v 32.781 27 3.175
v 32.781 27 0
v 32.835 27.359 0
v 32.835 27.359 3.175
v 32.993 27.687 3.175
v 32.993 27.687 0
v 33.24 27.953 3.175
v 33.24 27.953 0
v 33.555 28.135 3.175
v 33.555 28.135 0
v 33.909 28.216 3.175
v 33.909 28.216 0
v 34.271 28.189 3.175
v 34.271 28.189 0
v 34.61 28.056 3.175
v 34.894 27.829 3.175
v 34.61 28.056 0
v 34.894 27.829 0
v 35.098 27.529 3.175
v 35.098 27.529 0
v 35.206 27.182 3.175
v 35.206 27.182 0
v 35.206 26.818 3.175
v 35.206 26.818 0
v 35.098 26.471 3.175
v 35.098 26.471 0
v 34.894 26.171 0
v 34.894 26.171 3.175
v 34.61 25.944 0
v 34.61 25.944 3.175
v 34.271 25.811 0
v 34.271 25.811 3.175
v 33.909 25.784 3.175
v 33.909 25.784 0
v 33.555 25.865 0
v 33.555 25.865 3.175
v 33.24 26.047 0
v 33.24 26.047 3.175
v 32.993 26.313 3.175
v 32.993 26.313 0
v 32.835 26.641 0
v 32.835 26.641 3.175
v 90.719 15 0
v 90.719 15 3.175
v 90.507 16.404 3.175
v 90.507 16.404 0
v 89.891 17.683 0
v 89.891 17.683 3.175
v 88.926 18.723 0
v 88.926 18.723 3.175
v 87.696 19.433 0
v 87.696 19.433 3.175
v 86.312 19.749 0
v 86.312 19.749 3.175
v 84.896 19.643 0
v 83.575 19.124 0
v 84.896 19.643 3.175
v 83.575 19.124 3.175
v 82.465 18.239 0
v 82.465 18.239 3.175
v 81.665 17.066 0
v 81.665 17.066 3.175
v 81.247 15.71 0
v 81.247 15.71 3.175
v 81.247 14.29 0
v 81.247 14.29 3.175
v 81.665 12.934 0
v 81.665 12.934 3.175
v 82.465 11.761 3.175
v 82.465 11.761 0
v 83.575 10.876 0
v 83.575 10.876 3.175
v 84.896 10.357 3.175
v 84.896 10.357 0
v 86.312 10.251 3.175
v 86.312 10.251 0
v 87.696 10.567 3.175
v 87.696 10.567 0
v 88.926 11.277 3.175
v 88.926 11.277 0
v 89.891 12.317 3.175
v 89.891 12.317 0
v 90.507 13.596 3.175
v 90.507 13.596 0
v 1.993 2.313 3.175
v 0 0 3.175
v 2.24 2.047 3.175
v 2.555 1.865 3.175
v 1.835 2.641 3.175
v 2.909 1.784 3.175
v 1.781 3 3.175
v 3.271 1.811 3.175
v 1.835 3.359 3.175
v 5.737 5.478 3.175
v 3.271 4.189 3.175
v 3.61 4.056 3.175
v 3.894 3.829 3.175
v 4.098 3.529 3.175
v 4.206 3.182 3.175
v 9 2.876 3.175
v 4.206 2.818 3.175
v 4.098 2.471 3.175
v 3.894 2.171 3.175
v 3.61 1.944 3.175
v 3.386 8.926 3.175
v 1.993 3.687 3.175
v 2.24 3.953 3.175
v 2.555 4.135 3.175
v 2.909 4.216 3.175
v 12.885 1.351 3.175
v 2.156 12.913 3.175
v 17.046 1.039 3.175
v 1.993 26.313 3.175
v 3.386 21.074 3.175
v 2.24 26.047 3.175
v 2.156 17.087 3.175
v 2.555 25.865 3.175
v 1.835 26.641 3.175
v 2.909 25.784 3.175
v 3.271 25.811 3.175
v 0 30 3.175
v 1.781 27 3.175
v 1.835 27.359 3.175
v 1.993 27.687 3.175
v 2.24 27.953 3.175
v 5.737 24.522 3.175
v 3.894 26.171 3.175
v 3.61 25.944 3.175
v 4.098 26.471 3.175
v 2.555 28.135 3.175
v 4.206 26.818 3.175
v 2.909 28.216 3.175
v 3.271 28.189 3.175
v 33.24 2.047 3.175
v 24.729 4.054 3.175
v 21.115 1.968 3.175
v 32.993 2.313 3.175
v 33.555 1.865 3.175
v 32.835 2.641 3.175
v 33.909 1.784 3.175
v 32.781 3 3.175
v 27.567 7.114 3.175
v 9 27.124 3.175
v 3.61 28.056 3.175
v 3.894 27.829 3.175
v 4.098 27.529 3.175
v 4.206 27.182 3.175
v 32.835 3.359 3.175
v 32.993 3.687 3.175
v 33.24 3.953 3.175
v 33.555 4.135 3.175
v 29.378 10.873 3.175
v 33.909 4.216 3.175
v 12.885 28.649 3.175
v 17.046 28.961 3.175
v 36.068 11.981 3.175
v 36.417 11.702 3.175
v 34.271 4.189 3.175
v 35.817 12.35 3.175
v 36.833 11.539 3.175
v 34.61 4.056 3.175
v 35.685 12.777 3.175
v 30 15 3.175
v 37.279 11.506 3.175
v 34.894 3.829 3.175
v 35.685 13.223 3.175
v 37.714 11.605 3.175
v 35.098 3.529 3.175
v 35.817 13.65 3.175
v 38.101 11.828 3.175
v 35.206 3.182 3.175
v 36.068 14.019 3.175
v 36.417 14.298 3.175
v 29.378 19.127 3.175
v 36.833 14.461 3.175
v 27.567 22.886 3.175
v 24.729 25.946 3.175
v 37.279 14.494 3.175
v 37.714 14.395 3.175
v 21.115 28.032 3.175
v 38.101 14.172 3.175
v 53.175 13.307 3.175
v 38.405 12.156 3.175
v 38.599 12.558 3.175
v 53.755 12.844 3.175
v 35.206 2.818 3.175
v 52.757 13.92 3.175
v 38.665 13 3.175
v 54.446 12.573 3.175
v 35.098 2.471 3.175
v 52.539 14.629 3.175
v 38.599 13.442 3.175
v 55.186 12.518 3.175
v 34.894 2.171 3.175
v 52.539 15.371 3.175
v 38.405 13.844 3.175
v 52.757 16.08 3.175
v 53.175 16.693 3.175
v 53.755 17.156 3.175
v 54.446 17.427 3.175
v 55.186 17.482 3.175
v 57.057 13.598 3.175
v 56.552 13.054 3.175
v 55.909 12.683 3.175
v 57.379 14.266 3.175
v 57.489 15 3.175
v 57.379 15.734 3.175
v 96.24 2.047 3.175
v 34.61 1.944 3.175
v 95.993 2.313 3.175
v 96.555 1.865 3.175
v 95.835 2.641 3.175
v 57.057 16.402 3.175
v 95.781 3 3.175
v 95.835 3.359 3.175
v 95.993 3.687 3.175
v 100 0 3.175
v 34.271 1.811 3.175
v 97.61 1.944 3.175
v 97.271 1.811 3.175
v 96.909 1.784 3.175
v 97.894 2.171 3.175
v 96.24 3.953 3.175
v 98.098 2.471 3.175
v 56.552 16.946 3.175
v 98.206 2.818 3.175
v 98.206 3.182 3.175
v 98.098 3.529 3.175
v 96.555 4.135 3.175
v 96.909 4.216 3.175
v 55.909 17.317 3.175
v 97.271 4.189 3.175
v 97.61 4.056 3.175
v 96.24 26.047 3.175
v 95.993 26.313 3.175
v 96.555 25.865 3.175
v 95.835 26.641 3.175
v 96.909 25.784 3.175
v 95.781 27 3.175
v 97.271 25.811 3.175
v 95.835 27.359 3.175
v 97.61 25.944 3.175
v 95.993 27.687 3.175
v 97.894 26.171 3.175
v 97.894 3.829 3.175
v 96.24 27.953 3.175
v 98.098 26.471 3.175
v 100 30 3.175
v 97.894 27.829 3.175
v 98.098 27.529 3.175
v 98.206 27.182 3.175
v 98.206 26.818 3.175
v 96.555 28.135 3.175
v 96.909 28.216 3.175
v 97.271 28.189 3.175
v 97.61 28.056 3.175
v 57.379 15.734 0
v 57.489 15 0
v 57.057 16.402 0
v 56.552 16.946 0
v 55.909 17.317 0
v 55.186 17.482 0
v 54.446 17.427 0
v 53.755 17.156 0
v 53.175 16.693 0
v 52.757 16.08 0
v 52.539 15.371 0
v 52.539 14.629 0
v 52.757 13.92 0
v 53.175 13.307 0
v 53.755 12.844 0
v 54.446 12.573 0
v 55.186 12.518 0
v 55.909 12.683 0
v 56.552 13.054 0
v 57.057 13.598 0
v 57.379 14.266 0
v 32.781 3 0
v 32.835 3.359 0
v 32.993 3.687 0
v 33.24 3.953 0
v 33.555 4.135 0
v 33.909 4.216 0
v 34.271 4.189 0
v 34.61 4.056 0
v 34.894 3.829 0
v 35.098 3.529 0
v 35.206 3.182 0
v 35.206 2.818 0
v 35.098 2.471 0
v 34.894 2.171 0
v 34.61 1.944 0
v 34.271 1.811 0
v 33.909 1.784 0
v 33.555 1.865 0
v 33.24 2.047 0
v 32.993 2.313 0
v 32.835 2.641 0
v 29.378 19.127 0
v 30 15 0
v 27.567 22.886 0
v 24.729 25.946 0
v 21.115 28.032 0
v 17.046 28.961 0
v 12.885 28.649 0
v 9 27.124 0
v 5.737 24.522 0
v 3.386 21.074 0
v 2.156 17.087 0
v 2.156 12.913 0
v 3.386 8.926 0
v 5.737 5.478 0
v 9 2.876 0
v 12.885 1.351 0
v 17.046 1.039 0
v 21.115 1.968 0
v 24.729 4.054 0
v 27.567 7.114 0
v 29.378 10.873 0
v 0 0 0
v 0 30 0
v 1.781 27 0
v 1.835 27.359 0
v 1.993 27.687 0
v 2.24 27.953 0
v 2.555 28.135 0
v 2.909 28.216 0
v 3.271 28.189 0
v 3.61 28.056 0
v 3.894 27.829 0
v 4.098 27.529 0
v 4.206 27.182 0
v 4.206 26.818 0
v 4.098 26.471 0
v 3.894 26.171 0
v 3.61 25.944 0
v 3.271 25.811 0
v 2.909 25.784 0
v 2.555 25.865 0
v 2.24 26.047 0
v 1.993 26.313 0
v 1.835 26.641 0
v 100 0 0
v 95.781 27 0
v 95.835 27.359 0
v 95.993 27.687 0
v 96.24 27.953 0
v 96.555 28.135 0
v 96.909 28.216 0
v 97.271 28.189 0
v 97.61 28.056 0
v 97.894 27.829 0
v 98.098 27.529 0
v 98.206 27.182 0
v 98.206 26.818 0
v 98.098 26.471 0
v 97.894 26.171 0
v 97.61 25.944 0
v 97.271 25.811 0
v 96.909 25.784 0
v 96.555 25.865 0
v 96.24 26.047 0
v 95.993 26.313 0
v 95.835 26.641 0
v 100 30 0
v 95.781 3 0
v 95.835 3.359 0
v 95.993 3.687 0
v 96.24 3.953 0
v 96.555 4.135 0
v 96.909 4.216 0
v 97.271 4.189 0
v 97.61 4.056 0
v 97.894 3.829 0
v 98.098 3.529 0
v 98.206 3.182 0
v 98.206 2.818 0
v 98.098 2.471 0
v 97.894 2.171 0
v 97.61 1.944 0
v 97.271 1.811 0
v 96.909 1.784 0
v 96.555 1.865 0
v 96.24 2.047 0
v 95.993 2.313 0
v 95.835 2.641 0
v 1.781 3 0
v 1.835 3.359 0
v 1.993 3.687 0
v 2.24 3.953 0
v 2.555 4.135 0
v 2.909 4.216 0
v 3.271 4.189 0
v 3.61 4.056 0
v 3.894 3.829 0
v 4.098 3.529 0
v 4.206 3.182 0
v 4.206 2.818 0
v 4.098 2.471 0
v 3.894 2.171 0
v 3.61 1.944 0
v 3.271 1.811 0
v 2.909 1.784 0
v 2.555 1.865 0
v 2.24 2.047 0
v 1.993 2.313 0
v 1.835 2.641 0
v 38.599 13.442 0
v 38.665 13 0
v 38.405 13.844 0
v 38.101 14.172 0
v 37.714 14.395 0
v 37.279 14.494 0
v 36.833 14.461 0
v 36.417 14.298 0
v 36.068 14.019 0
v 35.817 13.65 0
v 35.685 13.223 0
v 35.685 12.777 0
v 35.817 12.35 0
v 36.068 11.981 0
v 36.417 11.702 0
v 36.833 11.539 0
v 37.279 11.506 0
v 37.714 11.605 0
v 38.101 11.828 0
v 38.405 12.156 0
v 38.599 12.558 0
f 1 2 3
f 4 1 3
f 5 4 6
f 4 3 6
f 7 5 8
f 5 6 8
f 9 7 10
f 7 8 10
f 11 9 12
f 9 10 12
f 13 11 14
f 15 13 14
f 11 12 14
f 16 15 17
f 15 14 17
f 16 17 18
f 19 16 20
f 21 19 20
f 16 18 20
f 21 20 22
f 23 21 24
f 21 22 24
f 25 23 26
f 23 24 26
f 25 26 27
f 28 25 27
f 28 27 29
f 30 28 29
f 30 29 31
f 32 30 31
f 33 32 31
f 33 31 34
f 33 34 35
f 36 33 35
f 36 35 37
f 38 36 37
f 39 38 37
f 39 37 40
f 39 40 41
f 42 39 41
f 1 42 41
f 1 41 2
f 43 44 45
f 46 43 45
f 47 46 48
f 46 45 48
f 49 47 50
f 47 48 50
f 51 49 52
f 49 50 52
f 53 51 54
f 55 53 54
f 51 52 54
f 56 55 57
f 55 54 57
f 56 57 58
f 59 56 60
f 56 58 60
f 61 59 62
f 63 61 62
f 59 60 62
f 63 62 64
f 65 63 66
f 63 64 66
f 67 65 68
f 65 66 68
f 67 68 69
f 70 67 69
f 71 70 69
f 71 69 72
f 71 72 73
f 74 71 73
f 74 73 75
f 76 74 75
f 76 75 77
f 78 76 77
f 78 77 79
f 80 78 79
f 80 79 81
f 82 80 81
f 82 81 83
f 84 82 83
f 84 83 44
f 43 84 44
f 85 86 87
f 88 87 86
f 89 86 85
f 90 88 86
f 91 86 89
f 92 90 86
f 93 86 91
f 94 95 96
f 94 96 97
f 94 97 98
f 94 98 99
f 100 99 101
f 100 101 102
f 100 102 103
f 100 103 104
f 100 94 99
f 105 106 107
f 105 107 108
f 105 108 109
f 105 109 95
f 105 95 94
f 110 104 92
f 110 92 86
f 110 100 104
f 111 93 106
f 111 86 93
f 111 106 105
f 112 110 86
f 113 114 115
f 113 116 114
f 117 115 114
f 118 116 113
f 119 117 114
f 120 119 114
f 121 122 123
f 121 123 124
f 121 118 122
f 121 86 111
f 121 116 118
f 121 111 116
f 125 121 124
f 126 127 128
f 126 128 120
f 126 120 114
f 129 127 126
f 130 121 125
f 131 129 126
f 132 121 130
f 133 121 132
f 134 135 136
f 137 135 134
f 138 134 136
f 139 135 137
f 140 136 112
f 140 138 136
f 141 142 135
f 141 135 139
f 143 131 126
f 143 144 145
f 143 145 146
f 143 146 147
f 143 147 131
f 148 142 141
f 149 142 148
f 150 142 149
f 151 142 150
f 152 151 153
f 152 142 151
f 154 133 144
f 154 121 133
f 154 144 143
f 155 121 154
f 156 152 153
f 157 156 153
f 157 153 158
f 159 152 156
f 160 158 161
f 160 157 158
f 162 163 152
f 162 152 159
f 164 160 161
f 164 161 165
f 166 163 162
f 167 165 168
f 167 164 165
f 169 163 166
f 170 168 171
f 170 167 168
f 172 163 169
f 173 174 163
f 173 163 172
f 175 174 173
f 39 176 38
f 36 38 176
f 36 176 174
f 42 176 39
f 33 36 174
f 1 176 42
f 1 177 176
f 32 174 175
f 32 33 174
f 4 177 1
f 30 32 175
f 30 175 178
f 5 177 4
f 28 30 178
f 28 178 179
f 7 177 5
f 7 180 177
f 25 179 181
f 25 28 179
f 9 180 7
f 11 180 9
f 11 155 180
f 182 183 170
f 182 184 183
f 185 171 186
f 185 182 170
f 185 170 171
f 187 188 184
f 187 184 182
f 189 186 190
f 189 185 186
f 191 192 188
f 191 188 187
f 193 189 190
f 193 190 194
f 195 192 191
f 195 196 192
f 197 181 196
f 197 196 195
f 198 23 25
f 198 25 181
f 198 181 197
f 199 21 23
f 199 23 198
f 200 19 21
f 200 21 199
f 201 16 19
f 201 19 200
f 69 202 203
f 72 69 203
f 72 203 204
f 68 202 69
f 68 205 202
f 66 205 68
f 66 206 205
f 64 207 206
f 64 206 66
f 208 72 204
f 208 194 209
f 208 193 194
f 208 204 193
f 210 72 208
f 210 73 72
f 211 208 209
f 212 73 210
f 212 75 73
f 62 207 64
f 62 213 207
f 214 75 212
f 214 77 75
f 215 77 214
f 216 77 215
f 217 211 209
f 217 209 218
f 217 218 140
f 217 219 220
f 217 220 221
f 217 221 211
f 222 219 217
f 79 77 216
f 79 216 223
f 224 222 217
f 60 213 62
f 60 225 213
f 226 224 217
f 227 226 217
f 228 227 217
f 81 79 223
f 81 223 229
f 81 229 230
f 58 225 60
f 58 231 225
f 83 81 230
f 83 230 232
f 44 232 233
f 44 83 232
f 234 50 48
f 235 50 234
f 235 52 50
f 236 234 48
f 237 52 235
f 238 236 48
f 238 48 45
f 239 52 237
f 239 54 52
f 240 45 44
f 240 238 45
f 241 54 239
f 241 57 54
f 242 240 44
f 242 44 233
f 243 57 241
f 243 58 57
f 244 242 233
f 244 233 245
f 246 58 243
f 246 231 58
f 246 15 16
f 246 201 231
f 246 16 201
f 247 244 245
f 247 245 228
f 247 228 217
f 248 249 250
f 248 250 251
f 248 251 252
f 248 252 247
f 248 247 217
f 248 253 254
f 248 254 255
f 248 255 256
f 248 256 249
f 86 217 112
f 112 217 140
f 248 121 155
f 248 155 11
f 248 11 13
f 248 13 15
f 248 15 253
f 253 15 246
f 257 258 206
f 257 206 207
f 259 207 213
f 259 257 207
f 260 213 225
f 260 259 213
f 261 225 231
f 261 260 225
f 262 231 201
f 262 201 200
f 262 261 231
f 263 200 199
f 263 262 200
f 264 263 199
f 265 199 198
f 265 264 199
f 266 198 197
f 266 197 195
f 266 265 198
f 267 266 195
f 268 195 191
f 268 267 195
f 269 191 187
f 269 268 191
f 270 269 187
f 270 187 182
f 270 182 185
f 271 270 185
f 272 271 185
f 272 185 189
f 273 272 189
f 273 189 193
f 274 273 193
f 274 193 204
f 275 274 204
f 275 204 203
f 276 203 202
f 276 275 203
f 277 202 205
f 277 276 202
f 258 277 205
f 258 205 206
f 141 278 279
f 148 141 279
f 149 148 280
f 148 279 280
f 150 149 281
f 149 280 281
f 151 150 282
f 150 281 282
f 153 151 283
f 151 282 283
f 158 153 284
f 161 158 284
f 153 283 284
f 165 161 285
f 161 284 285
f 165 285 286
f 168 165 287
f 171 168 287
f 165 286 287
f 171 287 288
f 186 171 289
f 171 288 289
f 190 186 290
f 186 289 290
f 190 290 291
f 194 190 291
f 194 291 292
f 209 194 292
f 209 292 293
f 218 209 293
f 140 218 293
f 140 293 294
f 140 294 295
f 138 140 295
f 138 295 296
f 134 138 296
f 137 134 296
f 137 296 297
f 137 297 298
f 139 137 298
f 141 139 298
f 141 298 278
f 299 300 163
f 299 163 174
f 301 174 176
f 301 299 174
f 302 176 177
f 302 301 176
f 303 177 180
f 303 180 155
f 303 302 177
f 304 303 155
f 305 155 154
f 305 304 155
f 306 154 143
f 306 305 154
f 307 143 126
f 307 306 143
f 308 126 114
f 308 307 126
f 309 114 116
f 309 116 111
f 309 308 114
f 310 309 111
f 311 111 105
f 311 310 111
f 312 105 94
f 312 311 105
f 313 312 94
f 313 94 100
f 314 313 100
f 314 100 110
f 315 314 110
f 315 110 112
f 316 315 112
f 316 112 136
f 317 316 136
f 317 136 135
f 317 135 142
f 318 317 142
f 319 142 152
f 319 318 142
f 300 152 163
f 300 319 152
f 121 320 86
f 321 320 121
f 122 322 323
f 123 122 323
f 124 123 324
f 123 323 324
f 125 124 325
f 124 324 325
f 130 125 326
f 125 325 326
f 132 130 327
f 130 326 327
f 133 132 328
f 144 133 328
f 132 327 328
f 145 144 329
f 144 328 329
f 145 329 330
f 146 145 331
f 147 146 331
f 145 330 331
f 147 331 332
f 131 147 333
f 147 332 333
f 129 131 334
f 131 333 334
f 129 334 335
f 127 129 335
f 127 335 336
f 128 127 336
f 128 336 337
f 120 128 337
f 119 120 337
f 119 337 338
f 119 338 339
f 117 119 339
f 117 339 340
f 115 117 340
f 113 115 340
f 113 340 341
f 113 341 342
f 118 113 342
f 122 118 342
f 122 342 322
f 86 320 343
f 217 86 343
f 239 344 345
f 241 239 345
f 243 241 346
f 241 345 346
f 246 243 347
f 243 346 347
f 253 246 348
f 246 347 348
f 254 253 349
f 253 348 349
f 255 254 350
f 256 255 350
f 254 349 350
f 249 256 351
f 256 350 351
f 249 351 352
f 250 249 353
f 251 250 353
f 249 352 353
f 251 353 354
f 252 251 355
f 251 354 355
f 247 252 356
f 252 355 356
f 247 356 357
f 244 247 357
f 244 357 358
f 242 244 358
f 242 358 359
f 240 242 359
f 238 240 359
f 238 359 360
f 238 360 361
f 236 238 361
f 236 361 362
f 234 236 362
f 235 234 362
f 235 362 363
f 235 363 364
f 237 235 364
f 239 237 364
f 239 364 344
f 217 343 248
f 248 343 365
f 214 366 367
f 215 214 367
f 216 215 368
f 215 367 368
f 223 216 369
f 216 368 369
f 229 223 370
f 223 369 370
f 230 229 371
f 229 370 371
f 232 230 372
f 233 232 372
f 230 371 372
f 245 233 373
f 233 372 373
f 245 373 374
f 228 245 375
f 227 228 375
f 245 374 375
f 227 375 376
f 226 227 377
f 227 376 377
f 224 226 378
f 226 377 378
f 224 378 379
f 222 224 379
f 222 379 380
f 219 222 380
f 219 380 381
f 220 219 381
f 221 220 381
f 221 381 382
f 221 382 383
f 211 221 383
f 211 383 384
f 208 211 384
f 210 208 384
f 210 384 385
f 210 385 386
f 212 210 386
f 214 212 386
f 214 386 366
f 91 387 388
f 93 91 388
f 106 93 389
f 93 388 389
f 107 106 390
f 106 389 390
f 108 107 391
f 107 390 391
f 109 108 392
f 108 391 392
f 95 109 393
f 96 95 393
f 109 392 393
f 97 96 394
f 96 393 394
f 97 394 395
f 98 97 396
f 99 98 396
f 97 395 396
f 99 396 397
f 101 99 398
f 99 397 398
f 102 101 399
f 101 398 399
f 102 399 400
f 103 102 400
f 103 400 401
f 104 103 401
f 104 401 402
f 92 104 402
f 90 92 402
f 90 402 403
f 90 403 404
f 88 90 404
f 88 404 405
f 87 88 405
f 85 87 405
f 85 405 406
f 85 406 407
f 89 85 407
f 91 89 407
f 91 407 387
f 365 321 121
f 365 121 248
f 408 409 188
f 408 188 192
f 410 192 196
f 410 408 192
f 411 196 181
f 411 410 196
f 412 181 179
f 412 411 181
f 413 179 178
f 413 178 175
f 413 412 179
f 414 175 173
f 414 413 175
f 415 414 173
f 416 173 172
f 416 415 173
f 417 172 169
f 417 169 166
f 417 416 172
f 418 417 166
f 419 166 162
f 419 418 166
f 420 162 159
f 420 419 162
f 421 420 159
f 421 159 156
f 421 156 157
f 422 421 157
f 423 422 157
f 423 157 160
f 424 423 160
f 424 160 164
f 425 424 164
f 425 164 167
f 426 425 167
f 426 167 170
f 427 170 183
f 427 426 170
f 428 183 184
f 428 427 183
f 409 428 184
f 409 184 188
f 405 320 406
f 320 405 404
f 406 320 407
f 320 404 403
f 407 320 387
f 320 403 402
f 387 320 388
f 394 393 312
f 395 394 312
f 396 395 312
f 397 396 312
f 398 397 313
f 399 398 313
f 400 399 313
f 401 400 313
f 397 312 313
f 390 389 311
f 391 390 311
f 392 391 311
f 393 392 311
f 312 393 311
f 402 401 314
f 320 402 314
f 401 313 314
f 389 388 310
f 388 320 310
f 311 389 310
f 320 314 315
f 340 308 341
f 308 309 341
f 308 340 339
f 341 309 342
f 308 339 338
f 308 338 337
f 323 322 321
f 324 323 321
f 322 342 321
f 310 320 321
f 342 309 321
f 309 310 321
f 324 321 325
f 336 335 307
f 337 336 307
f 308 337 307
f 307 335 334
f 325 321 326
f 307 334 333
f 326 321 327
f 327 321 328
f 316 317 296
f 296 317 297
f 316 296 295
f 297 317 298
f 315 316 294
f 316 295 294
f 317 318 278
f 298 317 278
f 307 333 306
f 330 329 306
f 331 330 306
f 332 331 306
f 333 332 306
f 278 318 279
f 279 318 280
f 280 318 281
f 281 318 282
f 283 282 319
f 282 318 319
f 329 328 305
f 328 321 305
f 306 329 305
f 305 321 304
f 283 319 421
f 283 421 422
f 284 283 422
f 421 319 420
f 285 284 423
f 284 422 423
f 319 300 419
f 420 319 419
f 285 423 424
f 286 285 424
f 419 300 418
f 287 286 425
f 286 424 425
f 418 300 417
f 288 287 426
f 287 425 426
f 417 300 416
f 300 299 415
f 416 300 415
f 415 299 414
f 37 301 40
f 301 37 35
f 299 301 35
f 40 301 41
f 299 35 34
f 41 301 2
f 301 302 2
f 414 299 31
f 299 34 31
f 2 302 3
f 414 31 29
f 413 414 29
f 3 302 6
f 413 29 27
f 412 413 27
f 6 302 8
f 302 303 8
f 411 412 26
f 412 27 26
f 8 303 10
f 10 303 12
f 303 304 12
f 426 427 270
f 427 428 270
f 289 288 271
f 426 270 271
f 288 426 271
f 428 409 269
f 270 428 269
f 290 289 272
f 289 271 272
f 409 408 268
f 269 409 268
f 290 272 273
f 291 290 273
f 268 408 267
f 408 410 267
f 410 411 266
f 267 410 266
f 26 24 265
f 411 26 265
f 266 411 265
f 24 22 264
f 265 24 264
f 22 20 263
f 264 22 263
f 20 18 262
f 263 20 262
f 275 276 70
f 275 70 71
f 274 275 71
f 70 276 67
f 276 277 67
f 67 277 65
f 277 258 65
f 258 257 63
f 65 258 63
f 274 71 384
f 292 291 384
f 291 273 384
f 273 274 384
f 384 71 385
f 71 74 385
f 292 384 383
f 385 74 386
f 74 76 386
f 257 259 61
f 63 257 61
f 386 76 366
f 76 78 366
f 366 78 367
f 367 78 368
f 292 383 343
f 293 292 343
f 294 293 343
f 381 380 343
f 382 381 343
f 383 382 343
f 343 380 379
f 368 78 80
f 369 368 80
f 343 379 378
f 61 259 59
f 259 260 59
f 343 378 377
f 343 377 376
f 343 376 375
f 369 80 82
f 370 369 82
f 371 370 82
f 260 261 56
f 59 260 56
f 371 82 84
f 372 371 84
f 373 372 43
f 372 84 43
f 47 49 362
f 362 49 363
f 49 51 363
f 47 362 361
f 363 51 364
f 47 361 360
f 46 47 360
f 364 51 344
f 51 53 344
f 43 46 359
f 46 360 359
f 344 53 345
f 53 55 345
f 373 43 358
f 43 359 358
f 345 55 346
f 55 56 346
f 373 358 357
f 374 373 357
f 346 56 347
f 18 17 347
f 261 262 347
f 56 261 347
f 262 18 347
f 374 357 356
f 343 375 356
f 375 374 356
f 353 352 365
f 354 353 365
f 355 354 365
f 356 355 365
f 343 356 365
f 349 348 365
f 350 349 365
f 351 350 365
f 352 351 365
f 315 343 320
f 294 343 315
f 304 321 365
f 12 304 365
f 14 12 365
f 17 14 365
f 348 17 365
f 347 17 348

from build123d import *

# Parameters (mm, degrees)
SKETCH1_W             = 100
SKETCH1_H             = 30
SKETCH1_R             = 2.4892
SKETCH1_R_2           = 1.4986
SKETCH1_R_3           = 14
BOSS_EXTRUDE2_DEPTH   = 3.175
F_2_CLEARANCE_HOLE1_D = 2.4384
SKETCH5_R             = 4.7625
CUT_EXTRUDE1_DEPTH    = 105.45133137


with BuildPart() as part:
    # Sketch1 → Boss-Extrude2 (new body)
    with BuildSketch(Plane.XY):
        with Locations((50, 15)):
            Rectangle(SKETCH1_W, SKETCH1_H)
        with Locations((55, 15)):
            Circle(SKETCH1_R, mode=Mode.SUBTRACT)
        with Locations((37.166699296, 13)):
            Circle(SKETCH1_R_2, mode=Mode.SUBTRACT)
        with Locations((16, 15)):
            Circle(SKETCH1_R_3, mode=Mode.SUBTRACT)
    extrude(amount=BOSS_EXTRUDE2_DEPTH)

    # #2 Clearance Hole1 (through all)
    with Locations(Plane.XY.offset(3.175)):
        with Locations((97, 3), (97, 27), (3, 27), (3, 3), (34, 27), (34, 3)):
            Hole(F_2_CLEARANCE_HOLE1_D / 2)

    # Sketch5 → Cut-Extrude1 (cut, through all)
    with BuildSketch(Plane.XY.offset(3.175)):
        with Locations((85.9562, 15)):
            Circle(SKETCH5_R)
    extrude(amount=-CUT_EXTRUDE1_DEPTH, mode=Mode.SUBTRACT)


solid = part.part
